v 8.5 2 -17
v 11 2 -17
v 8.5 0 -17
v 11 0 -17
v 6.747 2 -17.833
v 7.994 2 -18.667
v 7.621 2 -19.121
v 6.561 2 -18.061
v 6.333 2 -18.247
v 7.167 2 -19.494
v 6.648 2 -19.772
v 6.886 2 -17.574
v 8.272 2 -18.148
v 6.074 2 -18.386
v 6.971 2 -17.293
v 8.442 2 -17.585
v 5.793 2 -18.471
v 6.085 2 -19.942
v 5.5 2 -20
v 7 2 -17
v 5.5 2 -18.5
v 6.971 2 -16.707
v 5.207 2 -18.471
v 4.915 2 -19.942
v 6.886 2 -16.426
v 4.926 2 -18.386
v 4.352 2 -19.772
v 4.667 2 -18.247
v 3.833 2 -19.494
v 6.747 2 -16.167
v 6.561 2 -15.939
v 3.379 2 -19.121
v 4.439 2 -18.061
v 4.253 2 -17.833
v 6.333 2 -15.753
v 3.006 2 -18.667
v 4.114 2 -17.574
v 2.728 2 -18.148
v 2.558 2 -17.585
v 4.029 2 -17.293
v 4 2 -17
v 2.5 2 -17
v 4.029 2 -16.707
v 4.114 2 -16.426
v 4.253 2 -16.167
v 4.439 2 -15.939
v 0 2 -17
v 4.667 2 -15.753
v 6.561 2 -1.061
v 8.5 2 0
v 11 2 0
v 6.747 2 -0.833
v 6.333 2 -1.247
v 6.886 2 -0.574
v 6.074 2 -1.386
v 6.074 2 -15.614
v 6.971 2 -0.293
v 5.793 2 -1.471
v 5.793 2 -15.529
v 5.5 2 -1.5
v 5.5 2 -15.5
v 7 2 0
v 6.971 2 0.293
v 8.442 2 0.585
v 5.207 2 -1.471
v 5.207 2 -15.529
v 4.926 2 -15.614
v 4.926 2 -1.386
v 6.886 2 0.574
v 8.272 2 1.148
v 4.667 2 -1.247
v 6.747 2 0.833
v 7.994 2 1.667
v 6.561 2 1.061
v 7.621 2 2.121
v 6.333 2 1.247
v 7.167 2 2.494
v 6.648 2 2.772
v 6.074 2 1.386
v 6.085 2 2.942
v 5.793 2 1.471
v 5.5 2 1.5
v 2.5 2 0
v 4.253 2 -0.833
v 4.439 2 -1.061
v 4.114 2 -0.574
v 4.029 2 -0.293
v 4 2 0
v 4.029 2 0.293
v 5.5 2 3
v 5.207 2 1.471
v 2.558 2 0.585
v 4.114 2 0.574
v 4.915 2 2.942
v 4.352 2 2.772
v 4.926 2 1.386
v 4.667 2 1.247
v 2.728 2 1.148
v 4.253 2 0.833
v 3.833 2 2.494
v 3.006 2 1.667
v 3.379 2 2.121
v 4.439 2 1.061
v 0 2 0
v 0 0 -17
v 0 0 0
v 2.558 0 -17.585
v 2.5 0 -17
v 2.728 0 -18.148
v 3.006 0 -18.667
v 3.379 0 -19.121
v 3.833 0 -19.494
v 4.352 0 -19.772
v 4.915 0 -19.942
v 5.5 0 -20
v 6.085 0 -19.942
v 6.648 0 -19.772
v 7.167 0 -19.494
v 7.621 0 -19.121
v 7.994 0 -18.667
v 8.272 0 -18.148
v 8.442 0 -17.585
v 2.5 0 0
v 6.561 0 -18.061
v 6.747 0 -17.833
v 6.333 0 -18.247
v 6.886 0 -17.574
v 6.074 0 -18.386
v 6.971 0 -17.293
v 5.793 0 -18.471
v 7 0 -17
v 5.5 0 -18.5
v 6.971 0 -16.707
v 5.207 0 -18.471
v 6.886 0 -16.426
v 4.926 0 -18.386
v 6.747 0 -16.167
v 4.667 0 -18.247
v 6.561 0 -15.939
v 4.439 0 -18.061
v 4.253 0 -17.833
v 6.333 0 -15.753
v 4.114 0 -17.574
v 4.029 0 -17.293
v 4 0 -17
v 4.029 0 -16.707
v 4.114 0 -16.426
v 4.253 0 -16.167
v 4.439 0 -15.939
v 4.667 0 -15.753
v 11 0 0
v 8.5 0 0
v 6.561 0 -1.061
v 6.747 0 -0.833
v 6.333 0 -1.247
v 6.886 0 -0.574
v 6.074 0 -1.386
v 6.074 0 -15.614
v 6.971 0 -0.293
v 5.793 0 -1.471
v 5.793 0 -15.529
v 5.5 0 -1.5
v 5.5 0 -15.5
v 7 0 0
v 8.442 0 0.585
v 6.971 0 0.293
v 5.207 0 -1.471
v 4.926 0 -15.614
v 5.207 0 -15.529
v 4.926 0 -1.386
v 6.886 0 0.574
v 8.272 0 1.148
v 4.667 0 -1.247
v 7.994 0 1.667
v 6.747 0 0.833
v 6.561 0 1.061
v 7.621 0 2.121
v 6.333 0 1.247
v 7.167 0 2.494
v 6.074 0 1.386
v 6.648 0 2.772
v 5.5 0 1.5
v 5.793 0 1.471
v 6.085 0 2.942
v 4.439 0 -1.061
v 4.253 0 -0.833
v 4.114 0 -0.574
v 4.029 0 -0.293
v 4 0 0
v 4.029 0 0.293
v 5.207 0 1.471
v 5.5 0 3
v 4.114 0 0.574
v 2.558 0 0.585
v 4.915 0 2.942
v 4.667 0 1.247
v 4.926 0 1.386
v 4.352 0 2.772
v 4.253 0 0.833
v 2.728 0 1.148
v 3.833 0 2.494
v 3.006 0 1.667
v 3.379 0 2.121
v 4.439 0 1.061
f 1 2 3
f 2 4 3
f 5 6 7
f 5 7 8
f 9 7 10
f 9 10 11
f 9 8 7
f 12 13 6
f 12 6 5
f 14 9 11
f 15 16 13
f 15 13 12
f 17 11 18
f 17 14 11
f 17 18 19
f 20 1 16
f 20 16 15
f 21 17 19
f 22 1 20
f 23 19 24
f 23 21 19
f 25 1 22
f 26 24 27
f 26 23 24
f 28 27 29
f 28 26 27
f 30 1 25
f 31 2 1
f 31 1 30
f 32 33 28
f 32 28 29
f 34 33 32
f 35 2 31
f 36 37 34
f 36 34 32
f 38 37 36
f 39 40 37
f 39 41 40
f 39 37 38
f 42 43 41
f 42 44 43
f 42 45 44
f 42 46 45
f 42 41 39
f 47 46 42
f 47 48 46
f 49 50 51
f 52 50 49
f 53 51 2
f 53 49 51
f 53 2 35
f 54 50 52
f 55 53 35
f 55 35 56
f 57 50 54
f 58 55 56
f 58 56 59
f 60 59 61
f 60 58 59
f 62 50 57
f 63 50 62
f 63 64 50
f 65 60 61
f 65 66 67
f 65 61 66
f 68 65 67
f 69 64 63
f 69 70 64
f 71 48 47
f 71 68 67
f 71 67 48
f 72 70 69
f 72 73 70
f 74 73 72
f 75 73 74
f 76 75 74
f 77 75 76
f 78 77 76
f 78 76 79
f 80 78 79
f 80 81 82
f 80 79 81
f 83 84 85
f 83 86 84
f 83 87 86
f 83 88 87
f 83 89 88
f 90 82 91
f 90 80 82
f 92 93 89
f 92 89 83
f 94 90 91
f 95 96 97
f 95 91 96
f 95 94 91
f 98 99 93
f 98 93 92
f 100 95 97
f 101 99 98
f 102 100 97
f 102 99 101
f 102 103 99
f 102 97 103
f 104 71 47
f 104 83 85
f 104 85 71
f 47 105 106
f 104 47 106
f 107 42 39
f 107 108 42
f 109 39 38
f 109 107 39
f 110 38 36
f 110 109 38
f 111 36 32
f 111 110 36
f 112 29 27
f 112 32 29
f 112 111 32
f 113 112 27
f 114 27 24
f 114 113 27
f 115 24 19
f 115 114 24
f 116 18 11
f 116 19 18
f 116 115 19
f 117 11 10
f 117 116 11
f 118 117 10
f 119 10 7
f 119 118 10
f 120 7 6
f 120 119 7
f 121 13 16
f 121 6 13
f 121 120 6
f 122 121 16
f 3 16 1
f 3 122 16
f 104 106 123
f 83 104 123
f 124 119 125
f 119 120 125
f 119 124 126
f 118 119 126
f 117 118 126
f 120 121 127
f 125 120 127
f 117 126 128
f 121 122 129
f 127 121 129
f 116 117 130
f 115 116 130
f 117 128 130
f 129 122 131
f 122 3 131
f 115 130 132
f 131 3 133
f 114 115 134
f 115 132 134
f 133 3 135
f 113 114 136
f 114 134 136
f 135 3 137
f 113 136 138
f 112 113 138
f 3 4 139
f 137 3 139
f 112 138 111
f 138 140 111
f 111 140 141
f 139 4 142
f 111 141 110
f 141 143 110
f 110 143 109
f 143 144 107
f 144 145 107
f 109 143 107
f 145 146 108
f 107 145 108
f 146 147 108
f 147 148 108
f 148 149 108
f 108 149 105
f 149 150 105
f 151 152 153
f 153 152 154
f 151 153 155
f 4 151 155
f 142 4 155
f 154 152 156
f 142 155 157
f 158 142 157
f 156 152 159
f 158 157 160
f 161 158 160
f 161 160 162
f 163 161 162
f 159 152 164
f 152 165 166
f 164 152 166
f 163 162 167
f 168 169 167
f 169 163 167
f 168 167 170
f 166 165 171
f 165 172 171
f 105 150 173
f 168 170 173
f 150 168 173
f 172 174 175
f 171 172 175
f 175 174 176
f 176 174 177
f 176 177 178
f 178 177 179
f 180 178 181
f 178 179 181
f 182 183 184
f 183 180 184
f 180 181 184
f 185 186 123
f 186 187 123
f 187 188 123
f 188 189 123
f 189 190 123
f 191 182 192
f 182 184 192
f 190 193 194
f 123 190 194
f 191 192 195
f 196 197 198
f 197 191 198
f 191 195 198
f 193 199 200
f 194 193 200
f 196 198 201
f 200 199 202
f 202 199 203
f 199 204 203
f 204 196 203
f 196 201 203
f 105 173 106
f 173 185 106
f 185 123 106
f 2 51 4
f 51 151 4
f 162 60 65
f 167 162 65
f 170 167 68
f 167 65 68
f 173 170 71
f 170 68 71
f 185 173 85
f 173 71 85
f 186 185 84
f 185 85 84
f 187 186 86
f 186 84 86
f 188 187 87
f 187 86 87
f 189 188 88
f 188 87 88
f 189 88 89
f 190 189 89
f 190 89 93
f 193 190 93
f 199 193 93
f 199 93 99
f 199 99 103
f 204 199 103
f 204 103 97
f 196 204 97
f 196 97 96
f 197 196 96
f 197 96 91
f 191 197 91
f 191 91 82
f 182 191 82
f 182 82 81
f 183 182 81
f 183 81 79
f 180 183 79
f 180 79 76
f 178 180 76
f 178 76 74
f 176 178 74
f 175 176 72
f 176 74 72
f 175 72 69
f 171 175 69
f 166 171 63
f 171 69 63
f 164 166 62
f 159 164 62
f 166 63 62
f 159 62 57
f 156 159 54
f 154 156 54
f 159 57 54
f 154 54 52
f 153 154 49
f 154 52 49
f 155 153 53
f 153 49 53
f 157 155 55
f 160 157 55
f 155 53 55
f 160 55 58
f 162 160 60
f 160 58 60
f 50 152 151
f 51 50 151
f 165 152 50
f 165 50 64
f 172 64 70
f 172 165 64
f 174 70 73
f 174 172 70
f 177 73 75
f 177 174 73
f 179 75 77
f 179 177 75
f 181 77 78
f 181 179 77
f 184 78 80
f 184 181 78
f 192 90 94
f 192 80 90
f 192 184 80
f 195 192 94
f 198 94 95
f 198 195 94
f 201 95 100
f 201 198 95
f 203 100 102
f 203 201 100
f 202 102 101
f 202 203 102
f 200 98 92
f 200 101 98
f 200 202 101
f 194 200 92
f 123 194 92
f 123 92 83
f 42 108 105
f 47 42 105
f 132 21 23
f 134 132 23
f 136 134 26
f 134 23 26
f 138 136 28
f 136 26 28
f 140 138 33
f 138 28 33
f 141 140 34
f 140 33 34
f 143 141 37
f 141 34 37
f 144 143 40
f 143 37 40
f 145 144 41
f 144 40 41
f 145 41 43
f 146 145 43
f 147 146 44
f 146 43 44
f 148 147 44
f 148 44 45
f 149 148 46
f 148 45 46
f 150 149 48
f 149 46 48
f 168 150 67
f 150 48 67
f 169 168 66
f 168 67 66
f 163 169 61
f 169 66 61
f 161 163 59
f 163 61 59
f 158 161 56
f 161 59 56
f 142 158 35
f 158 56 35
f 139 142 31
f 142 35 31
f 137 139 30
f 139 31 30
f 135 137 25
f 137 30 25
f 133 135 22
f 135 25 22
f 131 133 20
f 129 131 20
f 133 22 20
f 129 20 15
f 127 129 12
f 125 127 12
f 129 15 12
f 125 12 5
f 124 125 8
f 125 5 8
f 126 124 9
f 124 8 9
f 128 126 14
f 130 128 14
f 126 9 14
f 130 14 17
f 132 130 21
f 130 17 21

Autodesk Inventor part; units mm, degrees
ref_plane "YZ Plane" through (0, 0, 0) normal (1, 0, 0) x (0, 1, 0)
ref_plane "XZ Plane" through (0, 0, 0) normal (0, 1, 0) x (-1, 0, 0)
ref_plane "XY Plane" through (0, 0, 0) normal (0, 0, 1) x (1, 0, 0)
sketch "Sketch1" plane through (0, 0, 0) normal (0, 1, 0) x (-1, 0, 0)
  line L0 (0, 0) -> (-11, 0)
  line L1 (-11, 0) -> (-11, -17)
  line L2 (-11, -17) -> (0, -17)
  line L3 (0, -17) -> (0, 0)
  circle A0 centre (-5.5, 0) radius 3
  circle A1 centre (-5.5, -17) radius 3
  circle A2 centre (-5.5, 0) radius 1.5
  circle A3 centre (-5.5, -17) radius 1.5
  circle A4 centre (-5.5, -17) radius 3
  circle A5 centre (-5.5, -17) radius 1.5
  circle A6 centre (-5.5, 0) radius 1.5
  circle A7 centre (-5.5, 0) radius 3
  point P0 (-8.5, -17)
  point P1 (-2.5, -17)
  point P2 (-2.5, 0)
  point P3 (-8.5, 0)
  dimension "d0" = 11
  dimension "d1" = 17
  dimension "d2" = 6
  dimension "d3" = 6
  dimension "d6" = 3
  dimension "d7" = 3
extrude "Extrusion1" add sketch "Sketch1" along normal blind 2
sketch "Sketch2" plane through (0, 2, 0) normal (0, 1, 0) x (1, 0, 0)
  point P0 (0, 0)
sketch "Sketch3" plane through (0, 0, 0) normal (0, -1, 0) x (1, 0, 0)
  point P0 (0, 0)
sketch "Sketch4" plane through (0, 0, 0) normal (0, -1, 0) x (1, 0, 0)
  arc A0 (8.5, 0) -> (2.5, 0) centre (5.5, 0) ccw projected
  circle A1 centre (5.5, 0) radius 1.5
  arc A2 (2.5, -17) -> (8.5, -17) centre (5.5, -17) ccw projected
  circle A3 centre (5.5, -17) radius 1.5
  circle A4 centre (5.5, -17) radius 1.5
  circle A5 centre (5.5, 0) radius 1.5
  point P0 (0, 0)
  dimension "d8" = 3
  dimension "d9" = 3
hole "Hole1" at (5.5, 0, 0) at (5.5, 0, -17) direction (0, 1, 0) diameter 3 end through all
properties part number "przykrywka"
